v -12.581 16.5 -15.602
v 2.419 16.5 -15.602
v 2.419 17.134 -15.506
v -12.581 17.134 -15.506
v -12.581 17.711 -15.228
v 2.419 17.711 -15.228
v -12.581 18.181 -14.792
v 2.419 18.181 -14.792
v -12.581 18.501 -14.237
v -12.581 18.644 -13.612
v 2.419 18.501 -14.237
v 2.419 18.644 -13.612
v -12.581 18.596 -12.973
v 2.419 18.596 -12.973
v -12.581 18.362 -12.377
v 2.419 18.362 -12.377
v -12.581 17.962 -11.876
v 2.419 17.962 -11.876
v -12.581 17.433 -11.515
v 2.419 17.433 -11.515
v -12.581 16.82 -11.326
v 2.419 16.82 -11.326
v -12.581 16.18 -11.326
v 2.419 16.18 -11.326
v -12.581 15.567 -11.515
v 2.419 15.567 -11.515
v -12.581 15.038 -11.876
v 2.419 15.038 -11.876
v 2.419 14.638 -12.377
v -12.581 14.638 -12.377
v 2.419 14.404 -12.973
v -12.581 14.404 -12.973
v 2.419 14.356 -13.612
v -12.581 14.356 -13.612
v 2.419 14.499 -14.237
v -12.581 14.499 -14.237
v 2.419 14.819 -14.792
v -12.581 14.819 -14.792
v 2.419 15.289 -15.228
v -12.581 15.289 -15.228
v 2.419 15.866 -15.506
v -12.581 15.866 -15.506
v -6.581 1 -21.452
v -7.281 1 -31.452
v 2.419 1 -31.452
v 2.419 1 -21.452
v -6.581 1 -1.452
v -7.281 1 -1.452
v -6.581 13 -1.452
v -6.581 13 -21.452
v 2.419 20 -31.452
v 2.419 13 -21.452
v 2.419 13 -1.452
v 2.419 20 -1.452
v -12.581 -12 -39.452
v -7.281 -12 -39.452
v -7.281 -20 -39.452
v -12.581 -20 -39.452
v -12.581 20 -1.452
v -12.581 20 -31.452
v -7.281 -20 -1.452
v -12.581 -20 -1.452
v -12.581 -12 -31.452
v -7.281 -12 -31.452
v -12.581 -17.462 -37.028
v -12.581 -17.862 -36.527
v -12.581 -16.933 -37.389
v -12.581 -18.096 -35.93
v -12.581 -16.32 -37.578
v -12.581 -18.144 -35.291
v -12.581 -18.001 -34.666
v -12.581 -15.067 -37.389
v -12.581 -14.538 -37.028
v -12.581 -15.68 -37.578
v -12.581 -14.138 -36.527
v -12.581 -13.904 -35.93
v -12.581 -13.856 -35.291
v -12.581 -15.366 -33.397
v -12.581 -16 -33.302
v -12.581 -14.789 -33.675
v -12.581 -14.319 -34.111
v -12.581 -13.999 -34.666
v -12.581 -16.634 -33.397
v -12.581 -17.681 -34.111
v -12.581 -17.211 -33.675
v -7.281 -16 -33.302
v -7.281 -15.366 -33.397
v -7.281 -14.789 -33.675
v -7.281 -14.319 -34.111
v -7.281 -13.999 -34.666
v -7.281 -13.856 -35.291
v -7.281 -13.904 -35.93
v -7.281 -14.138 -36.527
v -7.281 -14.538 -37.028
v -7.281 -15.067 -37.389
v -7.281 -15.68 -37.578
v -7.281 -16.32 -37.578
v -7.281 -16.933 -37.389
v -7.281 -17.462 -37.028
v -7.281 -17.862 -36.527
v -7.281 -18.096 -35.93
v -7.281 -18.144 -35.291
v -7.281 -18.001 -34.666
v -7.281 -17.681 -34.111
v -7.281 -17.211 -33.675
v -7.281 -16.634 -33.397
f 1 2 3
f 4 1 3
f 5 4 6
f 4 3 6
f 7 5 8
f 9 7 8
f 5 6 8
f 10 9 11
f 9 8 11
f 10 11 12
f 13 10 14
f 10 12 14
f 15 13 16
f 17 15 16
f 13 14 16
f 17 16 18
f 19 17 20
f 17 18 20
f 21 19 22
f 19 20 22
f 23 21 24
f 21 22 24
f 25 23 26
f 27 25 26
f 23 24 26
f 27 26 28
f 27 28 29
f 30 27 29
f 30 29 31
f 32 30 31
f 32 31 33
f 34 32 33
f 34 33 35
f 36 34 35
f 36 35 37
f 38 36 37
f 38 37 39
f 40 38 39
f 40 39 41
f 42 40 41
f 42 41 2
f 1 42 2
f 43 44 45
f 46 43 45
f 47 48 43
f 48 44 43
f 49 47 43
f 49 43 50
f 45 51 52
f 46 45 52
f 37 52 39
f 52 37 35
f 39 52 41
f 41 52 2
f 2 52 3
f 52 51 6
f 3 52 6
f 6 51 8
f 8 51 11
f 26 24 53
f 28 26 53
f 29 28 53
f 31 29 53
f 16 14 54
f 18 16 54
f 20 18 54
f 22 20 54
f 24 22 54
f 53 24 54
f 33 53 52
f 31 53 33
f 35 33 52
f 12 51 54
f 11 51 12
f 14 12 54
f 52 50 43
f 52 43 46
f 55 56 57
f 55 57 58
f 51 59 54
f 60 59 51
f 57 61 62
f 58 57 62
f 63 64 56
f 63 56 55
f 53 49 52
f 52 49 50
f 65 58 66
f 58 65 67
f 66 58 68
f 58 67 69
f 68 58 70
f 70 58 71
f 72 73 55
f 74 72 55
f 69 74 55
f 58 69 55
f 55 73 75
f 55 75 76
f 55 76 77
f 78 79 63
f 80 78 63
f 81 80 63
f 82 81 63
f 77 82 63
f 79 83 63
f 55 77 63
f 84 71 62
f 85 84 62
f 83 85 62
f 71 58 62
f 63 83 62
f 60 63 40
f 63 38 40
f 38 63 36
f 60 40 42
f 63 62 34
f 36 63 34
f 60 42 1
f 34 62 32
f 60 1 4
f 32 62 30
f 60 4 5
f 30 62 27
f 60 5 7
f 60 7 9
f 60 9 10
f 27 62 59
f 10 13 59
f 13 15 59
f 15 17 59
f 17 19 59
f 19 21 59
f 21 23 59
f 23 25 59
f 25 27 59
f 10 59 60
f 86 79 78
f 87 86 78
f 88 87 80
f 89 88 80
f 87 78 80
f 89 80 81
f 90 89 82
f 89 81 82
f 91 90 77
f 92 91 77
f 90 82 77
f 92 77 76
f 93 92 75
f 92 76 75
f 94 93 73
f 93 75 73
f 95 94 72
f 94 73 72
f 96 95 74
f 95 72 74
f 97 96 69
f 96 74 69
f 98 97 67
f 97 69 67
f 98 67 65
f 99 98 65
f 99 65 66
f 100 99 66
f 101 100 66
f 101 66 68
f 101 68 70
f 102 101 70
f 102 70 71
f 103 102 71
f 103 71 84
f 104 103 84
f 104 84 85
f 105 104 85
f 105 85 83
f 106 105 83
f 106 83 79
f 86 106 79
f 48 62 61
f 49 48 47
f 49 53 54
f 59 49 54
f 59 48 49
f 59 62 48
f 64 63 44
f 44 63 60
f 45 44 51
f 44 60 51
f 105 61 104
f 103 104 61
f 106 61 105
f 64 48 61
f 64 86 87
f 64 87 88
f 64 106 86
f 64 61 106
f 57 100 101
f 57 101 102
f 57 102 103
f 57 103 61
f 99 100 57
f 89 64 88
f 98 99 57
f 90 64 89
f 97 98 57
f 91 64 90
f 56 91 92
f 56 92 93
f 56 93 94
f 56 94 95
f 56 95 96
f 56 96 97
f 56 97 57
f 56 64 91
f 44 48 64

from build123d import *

# Parameters (mm, degrees)
SKETCH1_W           = 6
SKETCH1_H           = 35
BOSS_EXTRUDE1_DEPTH = 20
SKETCH2_W           = 35
SKETCH2_H           = 7
BOSS_EXTRUDE2_DEPTH = 9
SKETCH6_R           = 2.15
CUT_EXTRUDE1_DEPTH  = 16
SKETCH7_W           = 6
SKETCH7_H           = 8
BOSS_EXTRUDE3_DEPTH = 8
SKETCH8_R           = 2.15
CUT_EXTRUDE2_DEPTH  = 16
SKETCH9_W           = 9
SKETCH9_H           = 10
BOSS_EXTRUDE4_DEPTH = 12
CUT_EXTRUDE3_REACH  = 17
SKETCH10_W          = 5
SKETCH10_H          = 40
SKETCH11_W          = 30
SKETCH11_H          = 21
CUT_EXTRUDE4_DEPTH  = 0.7
SKETCH12_W          = 8
SKETCH12_H          = 8
CUT_EXTRUDE5_DEPTH  = 0.7


with BuildPart() as part:
    # Sketch1 → Boss-Extrude1 (new body, symmetric)
    with BuildSketch(Plane(origin=(0, 0, 0), x_dir=(1, 0, 0), z_dir=(0, 1, 0))):
        with Locations((-9.580645161, 13.951612903)):
            Rectangle(SKETCH1_W, SKETCH1_H)
    extrude(amount=BOSS_EXTRUDE1_DEPTH, both=True)

    # Sketch2 → Boss-Extrude2 (add)
    with BuildSketch(Plane(origin=(-6.580645161, 0, 0), x_dir=(0, 0, -1), z_dir=(1, 0, 0))):
        with Locations((13.951612903, 16.5)):
            Rectangle(SKETCH2_W, SKETCH2_H)
    extrude(amount=BOSS_EXTRUDE2_DEPTH)

    # Sketch6 → Cut-Extrude1 (cut, through all)
    with BuildSketch(Plane(origin=(2.419354839, 0, 0), x_dir=(0, 0, -1), z_dir=(1, 0, 0))):
        with Locations((13.451612903, 16.5)):
            Circle(SKETCH6_R)
    extrude(amount=-CUT_EXTRUDE1_DEPTH, mode=Mode.SUBTRACT)

    # Sketch7 → Boss-Extrude3 (add)
    with BuildSketch(Plane(origin=(0, 0, -31.451612903), x_dir=(-1, 0, 0), z_dir=(0, 0, -1))):
        with Locations((9.580645161, -16)):
            Rectangle(SKETCH7_W, SKETCH7_H)
    extrude(amount=BOSS_EXTRUDE3_DEPTH)

    # Sketch8 → Cut-Extrude2 (cut, through all)
    with BuildSketch(Plane.ZY.offset(12.580645161)):
        with Locations((-35.451612903, -16)):
            Circle(SKETCH8_R)
    extrude(amount=-CUT_EXTRUDE2_DEPTH, mode=Mode.SUBTRACT)

    # Sketch9 → Boss-Extrude4 (add)
    with BuildSketch(Plane.XZ.offset(-13)):
        with Locations((-2.080645161, -26.451612903)):
            Rectangle(SKETCH9_W, SKETCH9_H)
    extrude(amount=BOSS_EXTRUDE4_DEPTH)

    # Sketch10 → Cut-Extrude3 (cut, up to next)
    with BuildSketch(Plane.ZY.offset(12.580645161), mode=Mode.PRIVATE) as cut_extrude3_sk1:
        with Locations((1.048387097, 0)):
            Rectangle(SKETCH10_W, SKETCH10_H)
    cut_extrude3_tool1 = extrude(cut_extrude3_sk1.sketch, amount=-CUT_EXTRUDE3_REACH, mode=Mode.PRIVATE) & part.part
    add(cut_extrude3_tool1.solids().sort_by_distance((-12.580645, 0, 1.048387))[0], mode=Mode.SUBTRACT)

    # Sketch11 → Cut-Extrude4 (cut)
    with BuildSketch(Plane(origin=(-6.580645161, 0, 0), x_dir=(0, 0, -1), z_dir=(1, 0, 0))):
        with Locations((16.451612903, -9.5)):
            Rectangle(SKETCH11_W, SKETCH11_H)
    extrude(amount=-CUT_EXTRUDE4_DEPTH, mode=Mode.SUBTRACT)

    # Sketch12 → Cut-Extrude5 (cut)
    with BuildSketch(Plane(origin=(-6.580645161, 0, 0), x_dir=(0, 0, -1), z_dir=(1, 0, 0))):
        with Locations((35.451612903, -16)):
            Rectangle(SKETCH12_W, SKETCH12_H)
    extrude(amount=-CUT_EXTRUDE5_DEPTH, mode=Mode.SUBTRACT)


solid = part.part
